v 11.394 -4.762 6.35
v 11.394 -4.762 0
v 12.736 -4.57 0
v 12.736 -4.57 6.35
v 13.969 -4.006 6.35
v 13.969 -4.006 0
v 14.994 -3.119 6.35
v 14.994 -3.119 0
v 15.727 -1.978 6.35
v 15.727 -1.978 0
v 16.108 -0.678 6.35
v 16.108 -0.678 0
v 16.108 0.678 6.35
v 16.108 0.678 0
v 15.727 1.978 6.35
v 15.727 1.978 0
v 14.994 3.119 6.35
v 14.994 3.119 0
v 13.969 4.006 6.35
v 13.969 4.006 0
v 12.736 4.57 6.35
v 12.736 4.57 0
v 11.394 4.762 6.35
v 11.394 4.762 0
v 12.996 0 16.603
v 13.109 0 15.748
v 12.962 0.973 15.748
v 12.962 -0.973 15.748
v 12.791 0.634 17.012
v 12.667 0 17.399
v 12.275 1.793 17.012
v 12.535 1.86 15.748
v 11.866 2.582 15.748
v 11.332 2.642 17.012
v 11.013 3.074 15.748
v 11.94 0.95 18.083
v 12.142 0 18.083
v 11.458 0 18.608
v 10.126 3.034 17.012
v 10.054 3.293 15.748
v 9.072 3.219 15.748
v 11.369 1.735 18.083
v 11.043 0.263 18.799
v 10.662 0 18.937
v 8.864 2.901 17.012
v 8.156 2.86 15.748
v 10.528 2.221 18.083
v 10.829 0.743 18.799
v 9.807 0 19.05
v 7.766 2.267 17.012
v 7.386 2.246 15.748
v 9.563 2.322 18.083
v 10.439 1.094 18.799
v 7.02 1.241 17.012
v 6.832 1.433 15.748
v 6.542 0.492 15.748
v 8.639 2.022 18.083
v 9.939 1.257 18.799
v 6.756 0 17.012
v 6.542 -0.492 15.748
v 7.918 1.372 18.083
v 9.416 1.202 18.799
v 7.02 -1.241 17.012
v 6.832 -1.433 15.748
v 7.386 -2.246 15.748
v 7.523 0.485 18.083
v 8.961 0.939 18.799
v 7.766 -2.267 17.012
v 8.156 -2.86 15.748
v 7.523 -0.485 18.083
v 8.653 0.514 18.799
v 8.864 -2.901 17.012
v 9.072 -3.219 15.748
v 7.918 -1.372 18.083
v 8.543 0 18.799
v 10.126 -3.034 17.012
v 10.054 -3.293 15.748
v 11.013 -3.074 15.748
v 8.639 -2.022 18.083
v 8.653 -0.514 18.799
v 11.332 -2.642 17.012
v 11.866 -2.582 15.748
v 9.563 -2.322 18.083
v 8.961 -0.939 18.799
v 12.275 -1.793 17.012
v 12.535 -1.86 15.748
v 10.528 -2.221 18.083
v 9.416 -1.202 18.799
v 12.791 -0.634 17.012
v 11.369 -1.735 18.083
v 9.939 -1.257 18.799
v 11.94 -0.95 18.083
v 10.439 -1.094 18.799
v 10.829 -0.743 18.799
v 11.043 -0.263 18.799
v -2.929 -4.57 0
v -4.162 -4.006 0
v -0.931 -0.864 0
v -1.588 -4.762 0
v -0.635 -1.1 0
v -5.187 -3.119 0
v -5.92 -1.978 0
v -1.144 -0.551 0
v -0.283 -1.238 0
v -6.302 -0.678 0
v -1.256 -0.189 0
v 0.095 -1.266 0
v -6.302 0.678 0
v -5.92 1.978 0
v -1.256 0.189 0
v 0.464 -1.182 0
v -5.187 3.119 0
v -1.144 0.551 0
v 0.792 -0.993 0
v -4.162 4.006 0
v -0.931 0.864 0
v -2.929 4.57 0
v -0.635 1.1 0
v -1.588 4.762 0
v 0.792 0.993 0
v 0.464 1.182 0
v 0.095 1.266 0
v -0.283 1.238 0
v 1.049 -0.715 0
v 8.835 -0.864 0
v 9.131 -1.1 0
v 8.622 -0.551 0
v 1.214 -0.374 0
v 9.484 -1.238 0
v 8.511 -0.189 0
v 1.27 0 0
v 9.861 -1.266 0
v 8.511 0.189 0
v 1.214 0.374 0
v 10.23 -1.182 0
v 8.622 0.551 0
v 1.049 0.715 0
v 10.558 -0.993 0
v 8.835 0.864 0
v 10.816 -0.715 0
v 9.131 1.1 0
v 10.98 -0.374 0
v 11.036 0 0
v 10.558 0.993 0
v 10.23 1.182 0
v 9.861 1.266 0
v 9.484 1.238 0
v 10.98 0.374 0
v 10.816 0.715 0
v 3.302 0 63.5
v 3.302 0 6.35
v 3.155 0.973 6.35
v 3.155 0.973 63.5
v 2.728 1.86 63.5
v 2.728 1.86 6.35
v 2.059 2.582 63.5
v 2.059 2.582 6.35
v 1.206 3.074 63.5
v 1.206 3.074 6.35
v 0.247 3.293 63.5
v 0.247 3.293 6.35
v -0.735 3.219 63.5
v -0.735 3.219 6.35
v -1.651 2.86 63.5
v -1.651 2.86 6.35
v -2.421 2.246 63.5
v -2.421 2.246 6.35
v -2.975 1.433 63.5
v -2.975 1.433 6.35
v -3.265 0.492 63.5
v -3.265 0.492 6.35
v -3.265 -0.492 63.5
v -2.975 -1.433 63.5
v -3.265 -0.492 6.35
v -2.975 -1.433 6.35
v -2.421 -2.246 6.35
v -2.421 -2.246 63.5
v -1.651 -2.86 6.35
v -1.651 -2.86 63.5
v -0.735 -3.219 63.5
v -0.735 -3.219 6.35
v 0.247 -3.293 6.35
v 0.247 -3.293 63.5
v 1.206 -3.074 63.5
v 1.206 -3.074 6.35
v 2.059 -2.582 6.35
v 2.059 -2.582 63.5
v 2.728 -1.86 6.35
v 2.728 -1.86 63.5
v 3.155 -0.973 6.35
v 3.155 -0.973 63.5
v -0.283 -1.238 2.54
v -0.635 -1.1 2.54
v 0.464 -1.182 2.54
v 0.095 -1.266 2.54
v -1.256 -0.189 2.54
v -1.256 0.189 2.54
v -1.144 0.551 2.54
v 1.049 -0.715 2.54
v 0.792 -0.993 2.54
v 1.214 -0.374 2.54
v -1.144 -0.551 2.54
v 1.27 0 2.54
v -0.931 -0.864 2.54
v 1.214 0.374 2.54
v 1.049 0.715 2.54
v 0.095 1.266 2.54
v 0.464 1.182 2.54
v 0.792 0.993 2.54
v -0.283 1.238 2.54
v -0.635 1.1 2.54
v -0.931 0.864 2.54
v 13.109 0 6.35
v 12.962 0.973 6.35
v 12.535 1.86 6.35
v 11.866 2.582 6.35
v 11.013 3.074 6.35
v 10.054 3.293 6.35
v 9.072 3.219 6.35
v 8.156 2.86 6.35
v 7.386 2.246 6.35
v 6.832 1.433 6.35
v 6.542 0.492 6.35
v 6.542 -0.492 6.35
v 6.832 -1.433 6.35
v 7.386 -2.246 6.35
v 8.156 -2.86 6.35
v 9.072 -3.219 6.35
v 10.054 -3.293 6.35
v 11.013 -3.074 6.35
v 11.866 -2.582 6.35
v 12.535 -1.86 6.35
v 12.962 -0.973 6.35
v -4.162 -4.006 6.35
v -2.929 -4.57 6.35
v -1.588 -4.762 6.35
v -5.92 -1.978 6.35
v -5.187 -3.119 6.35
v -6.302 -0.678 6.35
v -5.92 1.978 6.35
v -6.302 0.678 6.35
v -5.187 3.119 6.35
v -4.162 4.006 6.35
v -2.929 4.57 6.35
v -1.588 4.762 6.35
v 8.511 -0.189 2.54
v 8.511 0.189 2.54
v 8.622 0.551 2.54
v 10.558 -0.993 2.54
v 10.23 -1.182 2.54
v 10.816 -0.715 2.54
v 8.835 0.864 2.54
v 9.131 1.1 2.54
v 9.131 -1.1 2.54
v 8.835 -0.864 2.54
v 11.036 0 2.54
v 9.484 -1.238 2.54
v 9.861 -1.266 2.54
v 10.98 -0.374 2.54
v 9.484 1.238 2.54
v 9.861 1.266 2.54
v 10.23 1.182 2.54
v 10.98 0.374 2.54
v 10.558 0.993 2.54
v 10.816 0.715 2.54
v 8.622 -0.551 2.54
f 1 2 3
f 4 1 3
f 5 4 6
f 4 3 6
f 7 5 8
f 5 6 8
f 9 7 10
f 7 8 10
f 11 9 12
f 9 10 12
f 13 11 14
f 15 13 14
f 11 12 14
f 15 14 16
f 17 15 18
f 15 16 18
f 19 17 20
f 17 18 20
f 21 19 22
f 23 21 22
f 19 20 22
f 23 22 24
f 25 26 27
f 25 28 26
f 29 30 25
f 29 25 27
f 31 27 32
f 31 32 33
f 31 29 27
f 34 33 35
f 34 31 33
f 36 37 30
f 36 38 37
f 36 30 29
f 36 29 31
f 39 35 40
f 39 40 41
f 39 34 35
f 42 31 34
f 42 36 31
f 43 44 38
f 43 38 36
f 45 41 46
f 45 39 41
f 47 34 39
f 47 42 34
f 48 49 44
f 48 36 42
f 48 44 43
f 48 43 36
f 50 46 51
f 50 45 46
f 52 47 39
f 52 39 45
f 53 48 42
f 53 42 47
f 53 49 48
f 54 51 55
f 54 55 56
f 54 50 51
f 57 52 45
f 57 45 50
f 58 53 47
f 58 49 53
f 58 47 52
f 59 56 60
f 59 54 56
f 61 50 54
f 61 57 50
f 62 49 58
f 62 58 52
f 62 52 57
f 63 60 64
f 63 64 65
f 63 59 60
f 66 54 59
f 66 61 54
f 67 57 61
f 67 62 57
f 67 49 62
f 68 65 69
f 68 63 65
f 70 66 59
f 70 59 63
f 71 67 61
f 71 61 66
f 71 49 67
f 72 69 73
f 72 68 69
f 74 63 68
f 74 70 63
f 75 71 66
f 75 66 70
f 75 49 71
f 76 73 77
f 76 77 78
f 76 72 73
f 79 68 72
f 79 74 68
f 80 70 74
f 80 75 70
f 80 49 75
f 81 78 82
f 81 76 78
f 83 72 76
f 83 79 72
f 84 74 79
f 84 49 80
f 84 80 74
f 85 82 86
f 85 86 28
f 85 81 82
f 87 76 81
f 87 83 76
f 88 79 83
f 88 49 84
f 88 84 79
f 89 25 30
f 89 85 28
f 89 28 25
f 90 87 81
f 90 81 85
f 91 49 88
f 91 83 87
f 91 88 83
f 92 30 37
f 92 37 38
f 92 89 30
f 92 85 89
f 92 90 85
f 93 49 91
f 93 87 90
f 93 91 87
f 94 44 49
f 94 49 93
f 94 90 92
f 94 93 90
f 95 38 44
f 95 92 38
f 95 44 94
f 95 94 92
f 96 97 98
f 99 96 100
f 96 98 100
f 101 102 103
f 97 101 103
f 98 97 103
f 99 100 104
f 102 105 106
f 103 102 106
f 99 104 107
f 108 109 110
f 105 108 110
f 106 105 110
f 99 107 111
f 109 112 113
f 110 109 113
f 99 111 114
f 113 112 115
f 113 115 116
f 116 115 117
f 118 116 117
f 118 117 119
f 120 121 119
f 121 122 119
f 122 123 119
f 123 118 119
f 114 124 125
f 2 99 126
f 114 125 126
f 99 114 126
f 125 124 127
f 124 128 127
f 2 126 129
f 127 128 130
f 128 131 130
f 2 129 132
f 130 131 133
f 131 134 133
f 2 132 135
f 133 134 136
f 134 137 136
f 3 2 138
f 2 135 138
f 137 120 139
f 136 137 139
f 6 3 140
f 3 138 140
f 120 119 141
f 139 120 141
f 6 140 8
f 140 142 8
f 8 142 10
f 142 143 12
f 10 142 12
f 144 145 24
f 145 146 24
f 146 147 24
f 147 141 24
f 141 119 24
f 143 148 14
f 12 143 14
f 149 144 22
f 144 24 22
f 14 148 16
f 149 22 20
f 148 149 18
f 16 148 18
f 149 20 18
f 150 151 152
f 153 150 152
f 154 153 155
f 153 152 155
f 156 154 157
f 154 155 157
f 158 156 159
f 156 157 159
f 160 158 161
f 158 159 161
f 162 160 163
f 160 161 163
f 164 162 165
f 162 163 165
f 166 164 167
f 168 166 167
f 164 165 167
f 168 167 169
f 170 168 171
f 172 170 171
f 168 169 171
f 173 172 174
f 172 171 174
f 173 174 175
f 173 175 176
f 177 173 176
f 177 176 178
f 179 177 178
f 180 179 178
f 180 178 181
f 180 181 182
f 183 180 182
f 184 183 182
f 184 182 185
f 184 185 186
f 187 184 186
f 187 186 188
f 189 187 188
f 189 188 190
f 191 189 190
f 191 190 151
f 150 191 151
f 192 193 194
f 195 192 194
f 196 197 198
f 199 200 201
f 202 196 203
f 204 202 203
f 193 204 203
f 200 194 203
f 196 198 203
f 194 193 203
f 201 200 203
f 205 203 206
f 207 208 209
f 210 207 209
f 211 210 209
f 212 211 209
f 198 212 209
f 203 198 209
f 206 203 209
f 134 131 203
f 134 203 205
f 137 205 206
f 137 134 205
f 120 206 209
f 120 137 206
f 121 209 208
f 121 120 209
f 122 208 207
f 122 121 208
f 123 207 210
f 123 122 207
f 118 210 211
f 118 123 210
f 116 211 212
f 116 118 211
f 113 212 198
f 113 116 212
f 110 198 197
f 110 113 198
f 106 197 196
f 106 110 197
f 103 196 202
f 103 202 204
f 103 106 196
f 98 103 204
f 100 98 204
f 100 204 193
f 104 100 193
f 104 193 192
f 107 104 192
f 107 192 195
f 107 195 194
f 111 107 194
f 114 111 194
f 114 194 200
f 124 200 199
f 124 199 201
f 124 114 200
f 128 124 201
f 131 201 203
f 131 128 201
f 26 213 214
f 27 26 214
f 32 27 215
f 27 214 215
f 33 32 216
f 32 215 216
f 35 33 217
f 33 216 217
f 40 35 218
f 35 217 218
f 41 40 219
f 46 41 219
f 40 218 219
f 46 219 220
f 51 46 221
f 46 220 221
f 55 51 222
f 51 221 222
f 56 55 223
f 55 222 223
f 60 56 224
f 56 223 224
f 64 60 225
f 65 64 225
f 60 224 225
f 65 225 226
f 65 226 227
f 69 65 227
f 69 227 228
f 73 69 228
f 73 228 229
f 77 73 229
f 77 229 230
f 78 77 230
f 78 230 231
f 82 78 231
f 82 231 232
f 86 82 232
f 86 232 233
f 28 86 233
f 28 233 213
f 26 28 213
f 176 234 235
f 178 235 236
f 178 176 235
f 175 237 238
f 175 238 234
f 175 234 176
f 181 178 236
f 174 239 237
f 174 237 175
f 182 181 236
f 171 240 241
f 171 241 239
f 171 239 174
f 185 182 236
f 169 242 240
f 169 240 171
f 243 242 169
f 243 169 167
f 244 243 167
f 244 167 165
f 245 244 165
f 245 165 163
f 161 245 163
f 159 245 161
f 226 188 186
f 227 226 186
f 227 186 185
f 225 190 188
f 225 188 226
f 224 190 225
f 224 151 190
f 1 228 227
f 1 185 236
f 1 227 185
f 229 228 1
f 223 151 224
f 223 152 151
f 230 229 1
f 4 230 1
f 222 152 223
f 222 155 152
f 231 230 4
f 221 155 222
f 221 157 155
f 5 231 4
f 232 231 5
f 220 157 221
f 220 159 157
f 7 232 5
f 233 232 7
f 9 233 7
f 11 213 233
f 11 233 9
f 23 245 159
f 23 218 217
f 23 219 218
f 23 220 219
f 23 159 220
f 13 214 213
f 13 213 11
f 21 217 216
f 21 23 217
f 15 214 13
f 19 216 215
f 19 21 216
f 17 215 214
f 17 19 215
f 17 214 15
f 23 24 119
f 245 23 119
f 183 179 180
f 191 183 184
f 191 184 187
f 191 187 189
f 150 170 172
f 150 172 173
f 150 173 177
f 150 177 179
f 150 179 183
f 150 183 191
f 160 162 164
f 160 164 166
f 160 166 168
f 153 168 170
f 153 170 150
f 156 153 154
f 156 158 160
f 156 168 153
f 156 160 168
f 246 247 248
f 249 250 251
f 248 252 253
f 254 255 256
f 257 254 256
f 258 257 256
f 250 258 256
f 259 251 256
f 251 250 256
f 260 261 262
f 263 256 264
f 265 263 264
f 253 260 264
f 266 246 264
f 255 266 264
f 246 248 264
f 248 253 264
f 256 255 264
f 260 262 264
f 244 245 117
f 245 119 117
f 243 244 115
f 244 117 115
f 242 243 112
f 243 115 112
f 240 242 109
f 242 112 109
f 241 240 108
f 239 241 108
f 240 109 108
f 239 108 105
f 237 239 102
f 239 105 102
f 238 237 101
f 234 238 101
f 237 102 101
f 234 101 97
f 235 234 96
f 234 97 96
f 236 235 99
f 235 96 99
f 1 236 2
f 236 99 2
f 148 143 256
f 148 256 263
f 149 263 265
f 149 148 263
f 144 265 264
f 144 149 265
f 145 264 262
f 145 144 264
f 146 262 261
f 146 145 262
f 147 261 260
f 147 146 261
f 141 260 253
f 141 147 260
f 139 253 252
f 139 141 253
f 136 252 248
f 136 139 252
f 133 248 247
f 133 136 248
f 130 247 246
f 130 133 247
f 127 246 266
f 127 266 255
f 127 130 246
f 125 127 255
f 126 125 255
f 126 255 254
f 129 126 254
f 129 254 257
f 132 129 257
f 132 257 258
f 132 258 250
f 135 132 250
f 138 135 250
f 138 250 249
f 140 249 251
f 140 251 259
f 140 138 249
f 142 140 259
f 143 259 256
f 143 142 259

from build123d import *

# Parameters (mm, degrees)
F1_DEPTH = 63.5
F0_R     = 3.302
F2_DEPTH = 19.05
F3_DEPTH = 5.08
F4_DEPTH = 1.27
F5_R     = 3.302
F6_R     = 1.27
F7_DEPTH = 2.54


with BuildPart() as f1:
    # F0 (on Top) → F1 (new body)
    with BuildSketch(Plane.XY):
        with BuildLine():
            ThreePointArc((-3.302, 0), (0, -3.302), (3.302, 0))
            ThreePointArc((3.302, 0), (0, 3.302), (-3.302, 0))
        make_face()
    extrude(amount=F1_DEPTH)



with BuildPart() as f2:
    # F0 (on Top) → F2 (new body)
    with BuildSketch(Plane.XY):
        with Locations((9.8069049418, 0)):
            Circle(F0_R)
    extrude(amount=F2_DEPTH)


with BuildPart() as f1_1:
    add(f1.part)

    add(f2.part)  # F3 merges F2
    # F0 (on Top) → F3 (join)
    with BuildSketch(Plane.XY):
        with BuildLine():
            Line((11.3944049418, 4.7625), (-1.5875, 4.7625))
            ThreePointArc((-1.5875, 4.7625), (-6.35, 0), (-1.5875, -4.7625))
            Line((-1.5875, -4.7625), (11.3944049418, -4.7625))
            ThreePointArc((11.3944049418, -4.7625), (16.1569049418, 0), (11.3944049418, 4.7625))
        make_face()
        with BuildLine():
            ThreePointArc((-3.302, 0), (0, 3.302), (3.302, 0))
            ThreePointArc((3.302, 0), (0, -3.302), (-3.302, 0))
        make_face(mode=Mode.SUBTRACT)
        with Locations((9.8069049418, 0)):
            Circle(F0_R, mode=Mode.SUBTRACT)
    extrude(amount=F3_DEPTH)

    # F4 (add): a face of the model
    f4_faces = [f1_1.faces().sort_by_distance(p)[0] for p in [
        (4.9034524709, 0, 5.08),
    ]]
    extrude(f4_faces, amount=F4_DEPTH)

    # F5
    f5_edges = [f1_1.edges().sort_by_distance(p)[0] for p in [
        (6.504905, 0, 19.05),
    ]]
    fillet(f5_edges, radius=F5_R)

    # F6 (on face) → F7 (cut)
    with BuildSketch(Plane.XY):
        Circle(F6_R)
        with Locations((9.7663812339, 0)):
            Circle(F6_R)
    extrude(amount=F7_DEPTH, mode=Mode.SUBTRACT)


solid = f1_1.part
